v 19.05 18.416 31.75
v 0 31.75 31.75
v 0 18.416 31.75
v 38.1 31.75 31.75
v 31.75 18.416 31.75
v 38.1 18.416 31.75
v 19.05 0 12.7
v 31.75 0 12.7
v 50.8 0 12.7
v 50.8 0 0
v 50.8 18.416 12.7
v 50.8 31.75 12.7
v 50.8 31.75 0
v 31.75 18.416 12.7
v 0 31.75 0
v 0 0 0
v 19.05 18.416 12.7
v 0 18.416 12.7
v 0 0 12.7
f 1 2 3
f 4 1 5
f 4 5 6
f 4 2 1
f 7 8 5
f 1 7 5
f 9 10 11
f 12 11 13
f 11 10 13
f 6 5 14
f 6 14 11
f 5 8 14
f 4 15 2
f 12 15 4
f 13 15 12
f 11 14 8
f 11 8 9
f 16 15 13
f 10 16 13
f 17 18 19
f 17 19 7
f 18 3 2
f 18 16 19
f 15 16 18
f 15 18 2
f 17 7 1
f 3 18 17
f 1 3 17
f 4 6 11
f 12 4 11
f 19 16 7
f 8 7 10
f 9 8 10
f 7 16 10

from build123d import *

# Parameters (mm, degrees)
F0_W      = 50.8
F0_H      = 31.75
F1_DEPTH  = 12.7
F2_W      = 50.8
F2_H      = 13.333772
F3_DEPTH  = 19.05
F5_DEPTH  = 25.4
F7_W      = 12.7
F7_H      = 19.05
F8_DEPTH  = 19.05
F10_DEPTH = 19.05


with BuildPart() as f1:
    # F0 (on Top) → F1 (new body)
    with BuildSketch(Plane.XY):
        with Locations((25.4, 15.875)):
            Rectangle(F0_W, F0_H)
    extrude(amount=F1_DEPTH)

    # F2 (on face) → F3 (join)
    with BuildSketch(Plane.XY.offset(12.7)):
        with Locations((25.4, 25.083114)):
            Rectangle(F2_W, F2_H)
    extrude(amount=F3_DEPTH)

    # F4 (on face) → F5 (cut)
    with BuildSketch(Plane.XZ.offset(-18.416228)):
        Polygon((38.1, 31.75), (50.8, 12.7), (50.8, 31.75), align=None)
    extrude(amount=-F5_DEPTH, mode=Mode.SUBTRACT)

    # F7 (on face) → F8 (join)
    with BuildSketch(Plane.XY.offset(12.7)):
        with Locations((25.4, 9.525)):
            Rectangle(F7_W, F7_H)
    extrude(amount=F8_DEPTH)

    # F9 (on face) → F10 (cut)
    with BuildSketch(Plane.YZ.offset(31.75)):
        Polygon((0, 12.7), (18.416228, 31.75), (0, 31.75), align=None)
    extrude(amount=-F10_DEPTH, mode=Mode.SUBTRACT)


solid = f1.part
